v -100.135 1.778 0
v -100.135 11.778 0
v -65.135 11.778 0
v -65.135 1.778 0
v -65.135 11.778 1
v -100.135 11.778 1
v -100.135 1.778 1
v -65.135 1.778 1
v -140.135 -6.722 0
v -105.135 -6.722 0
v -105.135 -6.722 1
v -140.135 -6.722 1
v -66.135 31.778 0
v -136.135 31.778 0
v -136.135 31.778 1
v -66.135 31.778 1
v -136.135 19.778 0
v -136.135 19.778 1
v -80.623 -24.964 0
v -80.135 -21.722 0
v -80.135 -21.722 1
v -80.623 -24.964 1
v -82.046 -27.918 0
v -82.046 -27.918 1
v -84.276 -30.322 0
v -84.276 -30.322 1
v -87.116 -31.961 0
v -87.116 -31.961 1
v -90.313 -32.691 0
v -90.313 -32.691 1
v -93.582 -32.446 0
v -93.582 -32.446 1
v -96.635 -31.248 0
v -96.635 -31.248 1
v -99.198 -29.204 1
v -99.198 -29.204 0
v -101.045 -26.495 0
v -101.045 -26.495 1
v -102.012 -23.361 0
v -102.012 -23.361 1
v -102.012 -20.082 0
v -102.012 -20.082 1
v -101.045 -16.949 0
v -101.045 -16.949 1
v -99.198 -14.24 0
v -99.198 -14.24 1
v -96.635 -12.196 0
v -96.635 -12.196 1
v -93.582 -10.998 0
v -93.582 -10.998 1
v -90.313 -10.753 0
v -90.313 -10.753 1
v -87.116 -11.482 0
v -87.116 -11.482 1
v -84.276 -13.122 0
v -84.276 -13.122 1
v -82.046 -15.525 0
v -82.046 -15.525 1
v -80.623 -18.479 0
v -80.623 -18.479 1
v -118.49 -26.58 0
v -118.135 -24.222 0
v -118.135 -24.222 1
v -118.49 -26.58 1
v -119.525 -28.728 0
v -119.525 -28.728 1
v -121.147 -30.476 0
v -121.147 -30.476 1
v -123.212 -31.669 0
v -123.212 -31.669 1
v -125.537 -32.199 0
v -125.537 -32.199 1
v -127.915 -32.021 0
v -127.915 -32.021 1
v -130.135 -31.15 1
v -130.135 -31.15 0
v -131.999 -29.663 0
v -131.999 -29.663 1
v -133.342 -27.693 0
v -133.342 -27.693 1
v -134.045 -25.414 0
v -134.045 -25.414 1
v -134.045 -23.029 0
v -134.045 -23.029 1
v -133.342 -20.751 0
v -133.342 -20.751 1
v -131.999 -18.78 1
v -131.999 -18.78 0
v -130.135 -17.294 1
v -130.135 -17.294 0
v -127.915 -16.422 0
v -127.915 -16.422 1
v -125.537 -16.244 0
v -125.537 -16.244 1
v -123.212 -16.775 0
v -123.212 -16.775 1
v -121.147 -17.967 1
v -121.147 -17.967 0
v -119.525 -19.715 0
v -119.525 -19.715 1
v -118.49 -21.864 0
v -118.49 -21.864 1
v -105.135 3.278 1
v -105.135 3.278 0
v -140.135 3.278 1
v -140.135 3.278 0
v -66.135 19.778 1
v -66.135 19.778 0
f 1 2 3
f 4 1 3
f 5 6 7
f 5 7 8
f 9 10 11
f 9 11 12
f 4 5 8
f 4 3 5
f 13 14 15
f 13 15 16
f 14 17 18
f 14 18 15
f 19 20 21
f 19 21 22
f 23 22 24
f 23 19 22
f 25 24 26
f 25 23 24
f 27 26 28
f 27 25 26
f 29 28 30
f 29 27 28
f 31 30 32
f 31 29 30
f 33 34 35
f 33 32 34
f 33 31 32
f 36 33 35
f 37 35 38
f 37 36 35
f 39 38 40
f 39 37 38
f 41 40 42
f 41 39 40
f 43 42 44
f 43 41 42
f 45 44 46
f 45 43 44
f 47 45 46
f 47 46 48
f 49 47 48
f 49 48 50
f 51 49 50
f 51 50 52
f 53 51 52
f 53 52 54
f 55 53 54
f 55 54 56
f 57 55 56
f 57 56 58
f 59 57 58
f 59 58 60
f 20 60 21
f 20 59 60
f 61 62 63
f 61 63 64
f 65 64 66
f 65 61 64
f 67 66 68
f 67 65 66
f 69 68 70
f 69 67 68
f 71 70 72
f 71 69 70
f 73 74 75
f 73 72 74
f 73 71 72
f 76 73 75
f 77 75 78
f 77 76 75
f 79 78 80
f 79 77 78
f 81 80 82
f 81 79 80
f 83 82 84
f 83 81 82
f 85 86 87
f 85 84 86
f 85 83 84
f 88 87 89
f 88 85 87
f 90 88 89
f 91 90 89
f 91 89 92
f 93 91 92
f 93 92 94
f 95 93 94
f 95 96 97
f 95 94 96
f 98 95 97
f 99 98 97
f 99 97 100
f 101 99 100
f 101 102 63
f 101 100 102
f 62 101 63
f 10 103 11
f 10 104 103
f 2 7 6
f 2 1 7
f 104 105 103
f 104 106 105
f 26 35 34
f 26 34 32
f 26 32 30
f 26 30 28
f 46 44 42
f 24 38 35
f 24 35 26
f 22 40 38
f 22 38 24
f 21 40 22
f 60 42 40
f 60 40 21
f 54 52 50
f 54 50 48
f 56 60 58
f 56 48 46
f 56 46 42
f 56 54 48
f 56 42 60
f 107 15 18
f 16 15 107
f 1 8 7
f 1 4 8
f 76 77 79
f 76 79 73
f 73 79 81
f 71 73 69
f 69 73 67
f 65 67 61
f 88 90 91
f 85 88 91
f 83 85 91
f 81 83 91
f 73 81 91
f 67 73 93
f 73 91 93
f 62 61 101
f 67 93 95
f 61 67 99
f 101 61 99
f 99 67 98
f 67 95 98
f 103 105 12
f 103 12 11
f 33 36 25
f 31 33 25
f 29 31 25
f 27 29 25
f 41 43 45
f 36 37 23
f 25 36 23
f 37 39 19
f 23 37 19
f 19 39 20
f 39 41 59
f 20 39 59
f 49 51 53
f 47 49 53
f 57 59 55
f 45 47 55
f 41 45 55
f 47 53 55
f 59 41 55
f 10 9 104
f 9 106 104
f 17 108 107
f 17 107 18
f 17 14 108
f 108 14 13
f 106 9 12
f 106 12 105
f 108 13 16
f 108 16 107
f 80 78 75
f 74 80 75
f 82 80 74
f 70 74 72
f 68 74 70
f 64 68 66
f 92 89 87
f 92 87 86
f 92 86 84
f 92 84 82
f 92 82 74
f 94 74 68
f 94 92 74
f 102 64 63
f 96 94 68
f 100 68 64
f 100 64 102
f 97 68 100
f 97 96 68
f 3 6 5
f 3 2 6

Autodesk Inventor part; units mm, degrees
ref_plane "YZ Plane" through (0, 0, 0) normal (1, 0, 0) x (0, 1, 0)
ref_plane "XZ Plane" through (0, 0, 0) normal (0, 1, 0) x (-1, 0, 0)
ref_plane "XY Plane" through (0, 0, 0) normal (0, 0, 1) x (1, 0, 0)
ref_plane "Work Plane1" through (0, 0, 0) normal (0, 0, 1) x (1, 0, 0)
sketch "Sketch1" plane through (0, 0, 0) normal (0, 0, 1) x (1, 0, 0)
  line L0 (-136.1347, 31.7782) -> (-66.1347, 31.7782)
  line L1 (-66.1347, 31.7782) -> (-66.1347, 19.7782)
  line L2 (-66.1347, 19.7782) -> (-136.1347, 19.7782)
  line L3 (-136.1347, 19.7782) -> (-136.1347, 31.7782)
  circle A0 centre (-126.1347, -24.2218) radius 8
  circle A1 centre (-126.1347, -24.2218) radius 10 construction
  circle A2 centre (-91.1347, -21.7218) radius 11
  circle A3 centre (-91.1347, -21.7218) radius 14.5 construction
  line L4 (-140.1347, 3.2782) -> (-105.1347, 3.2782)
  line L5 (-105.1347, 3.2782) -> (-105.1347, -6.7218)
  line L6 (-105.1347, -6.7218) -> (-140.1347, -6.7218)
  line L7 (-140.1347, -6.7218) -> (-140.1347, 3.2782)
  line L8 (-100.1347, 11.7782) -> (-65.1347, 11.7782)
  line L9 (-65.1347, 11.7782) -> (-65.1347, 1.7782)
  line L10 (-65.1347, 1.7782) -> (-100.1347, 1.7782)
  line L11 (-100.1347, 1.7782) -> (-100.1347, 11.7782)
  point P0 (0, 0)
  dimension "d0" = 70
  dimension "d1" = 12
  dimension "d2" = 16
  dimension "d3" = 20
  dimension "d4" = 22
  dimension "d5" = 29
  dimension "d6" = 10
  dimension "d7" = 35
  dimension "d8" = 10
  dimension "d9" = 35
  dimension "d11" = 8.5
  dimension "d12" = 25
  dimension "d13" = 2.5
  dimension "d14" = 35
  dimension "d15" = 5
  dimension "d16" = 20
  dimension "d17" = 15
  dimension "d77" = 14
extrude "Extrusion1" add sketch "Sketch1" along normal blind 1
sketch "Sketch2" plane through (0, 0, 1) normal (0, 0, 1) x (1, 0, 0)
  line L0 (-133.5304, 28.7782) -> (-67.3347, 28.7782) construction
  line L1 (-67.3347, 28.7782) -> (-67.3347, 21.7782) construction
  line L2 (-67.3347, 21.7782) -> (-133.5304, 21.7782) construction
  line L3 (-133.5304, 21.7782) -> (-133.5304, 28.7782) construction
  line L4 (-66.1347, 31.7782) -> (-136.1347, 31.7782) projected
  line L5 (-136.1347, 19.7782) -> (-66.1347, 19.7782) projected
  line L6 (-66.1347, 19.7782) -> (-66.1347, 31.7782) projected
  point P0 (0, 0)
  dimension "d82" = 3
  dimension "d83" = 2
  dimension "d84" = 1.2
decal "Decal1"
sketch "Sketch3" plane through (0, 0, 1) normal (0, 0, 1) x (1, 0, 0)
  line L0 (-93.1347, 9.7782) -> (-67.5514, 9.7782) construction
  line L1 (-67.5514, 9.7782) -> (-67.5514, 3.7782) construction
  line L2 (-67.5514, 3.7782) -> (-93.1347, 3.7782) construction
  line L3 (-93.1347, 3.7782) -> (-93.1347, 9.7782) construction
  line L4 (-100.1347, 11.7782) -> (-100.1347, 1.7782) projected
  line L5 (-65.1347, 11.7782) -> (-100.1347, 11.7782) projected
  line L6 (-100.1347, 1.7782) -> (-65.1347, 1.7782) projected
  line L7 (-65.1347, 1.7782) -> (-65.1347, 11.7782) projected
  point P0 (0, 0)
  dimension "d85" = 7
  dimension "d88" = 2
  dimension "d91" = 2
  dimension "d92" = 6
  dimension "d93" = 2.4167
decal "Decal2"
sketch "Sketch4" plane through (0, 0, 1) normal (0, 0, 1) x (1, 0, 0)
  line L0 (-135.6347, 1.2782) -> (-110.0514, 1.2782) construction
  line L1 (-110.0514, 1.2782) -> (-110.0514, -4.7218) construction
  line L2 (-110.0514, -4.7218) -> (-135.6347, -4.7218) construction
  line L3 (-135.6347, -4.7218) -> (-135.6347, 1.2782) construction
  line L4 (-140.1347, 3.2782) -> (-140.1347, -6.7218) projected
  line L5 (-105.1347, 3.2782) -> (-140.1347, 3.2782) projected
  line L6 (-140.1347, -6.7218) -> (-105.1347, -6.7218) projected
  line L7 (-105.1347, -6.7218) -> (-105.1347, 3.2782) projected
  point P0 (0, 0)
  dimension "d95" = 4.5
  dimension "d96" = 2
  dimension "d97" = 2
  dimension "d98" = 4.9167
decal "Decal3"
properties part number "on-air-control-layout-2"
